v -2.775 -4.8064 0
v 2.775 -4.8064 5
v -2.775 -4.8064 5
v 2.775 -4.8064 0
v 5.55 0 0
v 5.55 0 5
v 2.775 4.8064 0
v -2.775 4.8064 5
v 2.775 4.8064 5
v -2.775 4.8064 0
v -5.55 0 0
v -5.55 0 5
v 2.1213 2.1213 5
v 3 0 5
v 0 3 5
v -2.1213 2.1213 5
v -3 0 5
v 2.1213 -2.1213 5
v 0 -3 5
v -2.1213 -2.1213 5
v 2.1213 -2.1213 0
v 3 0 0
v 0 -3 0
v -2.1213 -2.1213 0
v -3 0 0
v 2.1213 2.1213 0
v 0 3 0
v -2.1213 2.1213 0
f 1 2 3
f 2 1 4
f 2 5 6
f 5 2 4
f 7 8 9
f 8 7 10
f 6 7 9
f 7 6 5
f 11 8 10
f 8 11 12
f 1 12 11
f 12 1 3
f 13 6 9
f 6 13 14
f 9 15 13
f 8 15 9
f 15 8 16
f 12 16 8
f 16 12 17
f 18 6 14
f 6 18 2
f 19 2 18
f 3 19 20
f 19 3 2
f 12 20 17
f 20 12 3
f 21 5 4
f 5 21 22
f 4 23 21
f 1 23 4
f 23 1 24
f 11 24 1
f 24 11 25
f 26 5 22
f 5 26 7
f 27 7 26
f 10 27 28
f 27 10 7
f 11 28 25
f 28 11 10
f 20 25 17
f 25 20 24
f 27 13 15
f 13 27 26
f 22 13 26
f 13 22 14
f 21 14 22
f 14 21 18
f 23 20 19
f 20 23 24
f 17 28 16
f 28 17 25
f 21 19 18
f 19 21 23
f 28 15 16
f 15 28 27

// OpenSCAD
// file: ../../lib/scad/nuts.scad
//Muts
include <../../settings/scad/global.scad>

fnl = fn; //fn local

//Mx = [rInt, rExt, height]
M3 = [1.5, 3, 2.2];
M4 = [2, 3.85, 3];
M5 = [2.5, 4.4, 4.5];
M6 = [3, 5.55, 5];
M8 = [4, 7.2, 6.44];
//M = [,,];


module nut_Mx(rInt=4,rExt=7.2,height=6.44){
		difference(){
			cylinder(height,rExt,rExt, $fn=6);
			translate([0,0,-1])
			cylinder(height+2,rInt,rInt, $fn=4*2*fnl);
		}
}

module nut_M3(){
	nut_Mx(M3[0], M3[1], M3[2]);
}
module nut_M4(){
	nut_Mx(M4[0], M4[1], M4[2]);
}
module nut_M5(){
	nut_Mx(M5[0], M5[1], M5[2]);
}
module nut_M6(){
	nut_Mx(M6[0], M6[1], M6[2]);
}
module nut_M8(){
	nut_Mx(M8[0], M8[1], M8[2]);
}

nut_M6();

module nut_M8_x(posX=0,posY=0,posZ=0){
	translate([posX,posY,posZ])
		rotate([0,90,0])
			color("grey")
				nut_M8();
}

module nut_M8_y(posX=0,posY=0,posZ=0){
	translate([posX,posY,posZ])
		rotate([-90,0,0])
			color("lightgrey")
				nut_M8();
}
module nut_M8_z(posX=0,posY=0,posZ=0){
	translate([posX,posY,posZ])
		rotate([0,0,90])
			color("darkgrey")
				nut_M8();
}
// file: ../../lib/scad/threadedBars.scad
//Threaded Bars
include <../../settings/scad/global.scad>

fnl = fn; //fn local

module threadedBar_M8_x(posX=0,posY=0,posZ=0, length=400){
	translate([posX,posY,posZ])
		rotate([0,90,0])
			color("grey")
				cylinder(length,4,4, $fn=8*fnl);
}

module threadedBar_M8_y(posX=0,posY=0,posZ=0, length=400){
	translate([posX,posY,posZ])
		rotate([-90,0,0])
			color("lightgrey")
				cylinder(length,4,4, $fn=8*fnl);
}
module threadedBar_M8_z(posX=0,posY=0,posZ=0, length=400){
	translate([posX,posY,posZ])
		rotate([0,0,90])
			color("darkgrey")
				cylinder(length,4,4, $fn=8*fnl);
}
// file: basement.scad
include <../../settings/scad/global.scad>

include <../../prn_200x200x200/scad/connector_m8.scad>
include <../../lib/scad/threadedBars.scad>
include <../../lib/scad/nuts.scad>


module threadedBarX(){
	threadedBar_M8_x(posX=-lnConnect-lnNuts, length=lnBase+2*(lnConnect+lnNuts));
	nut_M8_x(posX=-lnConnect-lnNuts+lnNutsShift);
	nut_M8_x(posX=0+lnNutsShift);
	nut_M8_x(posX=lnBase-lnNuts+lnNutsShift);
	nut_M8_x(posX=lnBase+lnConnect+lnNutsShift);
}

module threadedBarY(){
	threadedBar_M8_y(posY=-lnConnect-lnNuts, length=lnBase+2*(lnConnect+lnNuts));
	nut_M8_y(posY=-lnConnect-lnNuts+lnNutsShift);
	nut_M8_y(posY=0+lnNutsShift);
	nut_M8_y(posY=lnBase-lnNuts+lnNutsShift);
	nut_M8_y(posY=lnBase+lnConnect+lnNutsShift);
}

module basement() {
//front X
translate([0,-lnConnect+lnNuts-lnNutsShift,0]){
	connector_M8(posX=-lnConnect, clr="grey");
	connector_M8(posX=lnBase, clr="grey");
	translate([0,0,0]);
		threadedBarX();
	translate([0,lnConnect-Mx*2,0])
		threadedBarX();
	translate([0,(lnConnect-Mx*2)/2,(Mx-1)*4])
		threadedBarX();
}//translate

//back X
translate([0,lnNuts-lnNutsShift,0]){
	connector_M8(posX=-lnConnect, posY=lnBase, clr="grey");
	connector_M8(posX=lnBase, posY=lnBase, clr="grey");
	translate([0,lnBase,0])
		threadedBarX();
	translate([0,lnBase+lnConnect-Mx*2,0])
		threadedBarX();
	translate([0,lnBase+(lnConnect-Mx*2)/2,(Mx-1)*4])
		threadedBarX();
}//translate

// Y bars left
translate([-Mx,0, Mx*2-2])
	threadedBarY();	
translate([-lnConnect+Mx,0, Mx*2-2])
	threadedBarY();	
translate([(-lnConnect)/2,0, Mx*2-2+(Mx-1)*4])
	threadedBarY();	

// Y bars right
translate([lnBase+lnConnect-Mx,0, Mx*2-2])
	threadedBarY();	
translate([lnBase+Mx,0, Mx*2-2])
	threadedBarY();	
translate([lnBase+(lnConnect)/2,0, Mx*2-2+(Mx-1)*4])
	threadedBarY();
}//end of basement
// file: connector_m8.scad
include <../../settings/scad/global.scad>

include <../../lib/scad/threadedBars.scad>
include <../../lib/scad/nuts.scad>

fnl = 4*fn; //fn local
correction=1;
MX = 8;

M = MX-correction; //use M8 threaded bars
length=50;
lengthCorrected = length - 2*correction;
M_2 = M/2;
MX_2 = MX/2;

//threadedBar_M8_x(posXi=-10);
//nut_M8_x(posXi=-8);


module holderThrBar(posXi=0, posYi=0, posZi=0, rotXi=0, rotYi=0, rotZi=0, clri="red", Mx=8){
	translate([posXi, posYi, posZi])
		rotate([rotXi, rotYi, rotZi])
			color(clri)
				difference(){
					cylinder (length,Mx,Mx, $fn=Mx*fnl);
						translate([0,0,-1])
						cylinder (length+2,Mx/2+0.2,Mx/2+0.2, $fn=Mx/2*fnl);
				}//diff
} //holderThrBar

module holderThrBarX2(posXi=0, posYi=0, posZi=0, rotXi=0, rotYi=0, rotZi=0, clri="red", Mx=8){
	translate([posXi, posYi, posZi])
		rotate([rotXi, rotYi, rotZi])
			color(clri)
				difference(){
					cylinder (length*2,Mx,Mx, $fn=Mx*fnl);
						translate([0,0,-1])
						cylinder (length*2+2,Mx/2+0.2,Mx/2+0.2, $fn=Mx/2*fnl);
				}//diff
} //holderThrBar

module holderShaftBar(posXi=0, posYi=0, posZi=0, rotXi=0, rotYi=0, rotZi=0, clri="green", Mx=8){
	translate([posXi, posYi, posZi])
		rotate([rotXi, rotYi, rotZi])
			color(clri)
				difference(){
					cylinder (length,Mx,Mx, $fn=Mx*fnl);
						translate([0,0,length/2-1])
						cylinder (length/2+2,Mx/2+0.2,Mx/2+0.2, $fn=Mx/2*fnl);
				}//diff
} //holderShaftBar


module connector_M8(posX=0, posY=0, posZ=0, rotX=0, rotY=0, rotZ=0, clr="red"){
	translate([posX, posY, posZ])
		rotate([rotX, rotY, rotZ])
			color(clr){
				holderThrBar(rotYi=90, clri=clr);
				holderThrBar(posYi=length-M*2-correction*2, rotYi=90, clri=clr);
				holderThrBar(posYi=(length-M*2-correction*2)/2, posZi=M*4, rotYi=90, clri=clr);

				holderThrBar(posXi=length/2, posYi=-M-correction, posZi=M*6, rotYi=90, rotZi=90, clri=clr);
				holderThrBar(posXi=M+correction, posYi=-M-correction, posZi=M*2, rotYi=90, rotZi=90, clri=clr);
				holderThrBar(posXi=length-M-correction, posYi=-M-correction, posZi=M*2, rotYi=90, rotZi=90, clri=clr);
			}//transform
}//connector


module connector_M8_shaftY(posX=0, posY=0, posZ=0, rotX=0, rotY=0, rotZ=0, clr="green"){
	translate([posX, posY, posZ])
		rotate([rotX, rotY, rotZ])
			color(clr){
				holderThrBarX2(rotYi=90, clri=clr);
				holderThrBarX2(posYi=length-M*2-correction*2, rotYi=90, clri=clr);
				holderThrBarX2(posYi=(length-M*2-correction*2)/2, posZi=M*4, rotYi=90, clri=clr);

				
				holderShaftBar(posXi=M+correction, posYi=-M-correction, posZi=M*2, rotYi=90, rotZi=90, clri=clr);
				holderShaftBar(posXi=length*2-M-correction, posYi=-M-correction, posZi=M*2, rotYi=90, rotZi=90, clri=clr);
			}//transform
}//connector
//holderShaftBar();

//support
/*
translate([0,MX_2+0.2,-MX])
	cube([length,length-MX*3-0.2*2,MX*2]);

translate([M,-MX,M])
	cube([length-MX*3-0.2*2,length,MX*2]);
*/
/*
translate([0,-M,-M])
	difference(){
		minkowski(){
			cube([lengthCorrected,lengthCorrected,lengthCorrected]);
			sphere(M/2, $fn = 4*4*fnl);
		}//minkowski
		translate([0,0,-M_2])
			cube([lengthCorrected,lengthCorrected,lengthCorrected+M]);
		translate([0,-M_2,0])
			cube([lengthCorrected,lengthCorrected+M,lengthCorrected]);
		translate([-M_2,0,0])
			cube([lengthCorrected+M,lengthCorrected,lengthCorrected]);
}
*/
// file: ../../lib/scad/shafts.scad
fn_8mm = 20;
//shaft_8x350_x(posX, posY, posZ);
//shaft_8x350_y(posX, posY, posZ);
//shaft_8x350_z(posX, posY, posZ);

module shaft_8x350_x(posX=0,posY=0,posZ=0){
	translate([posX,posY,posZ])
		rotate([0,90,0])
			color("blue")
				cylinder(350,4,4, $fn=fn_8mm);
}

module shaft_8x350_y(posX=0,posY=0,posZ=0){
	translate([posX,posY,posZ])
		rotate([-90,0,0])
			color("lightblue")
				cylinder(350,4,4, $fn=fn_8mm);
}

module shaft_8x350_z(posX=0,posY=0,posZ=0){
	translate([posX,posY,posZ])
		rotate([0,0,90])
			color("darkblue")
				cylinder(350,4,4, $fn=fn_8mm);
}
// file: ../../settings/scad/global.scad
fn = 1;

shaftX_posZ = 100;

shaftY_posX = 100;

shaftZ_posY = 150;

lnBase = 300;			//lengthBase
lnConnect = 50;		//lengthConnect
lnNuts = 10;			//lengthNuts
lnNutsShift = 2;		//M8 Nut ~ 6 mm, so +2 mm from both side will give a lnNuts 10mm value 

Mx = 8;
correction=1;
M = Mx-correction; //use M8 threaded bars
M_2 = M/2;
Mx_2 = Mx/2;
// main file
include <../../settings/scad/global.scad>
include <../../lib/scad/shafts.scad>
include <../../prn_200x200x200/scad/connector_m8.scad>
include <../../prn_200x200x200/scad/basement.scad>

//basement();


shaftY_0=[shaftY_posX+Mx,-lnConnect/2,(Mx-correction)*2];
shaftY_1=[shaftY_posX+lnConnect*2-Mx,-lnConnect/2,(Mx-correction)*2];

module chassis_axisY() {
	connector_M8_shaftY(posX=shaftY_posX, posY=-lnConnect+Mx);
	connector_M8_shaftY(posX=shaftY_posX, posY=lnBase+Mx);

	// --- Y shafts
	shaft_8x350_y(shaftY_0[0],shaftY_0[1],shaftY_0[2]);
	LLMK8UU_yp(shaftY_0[0],shaftY_0[1]+100,shaftY_0[2]);
	LLMK8UU_yn(shaftY_0[0],shaftY_0[1]+200,shaftY_0[2]);

	shaft_8x350_y(shaftY_1[0],shaftY_1[1],shaftY_1[2]);
	LLMK8UU_yp(shaftY_1[0],shaftY_1[1]+100,shaftY_1[2]);
	LLMK8UU_yn(shaftY_1[0],shaftY_1[1]+200,shaftY_1[2]);
}//axisY
